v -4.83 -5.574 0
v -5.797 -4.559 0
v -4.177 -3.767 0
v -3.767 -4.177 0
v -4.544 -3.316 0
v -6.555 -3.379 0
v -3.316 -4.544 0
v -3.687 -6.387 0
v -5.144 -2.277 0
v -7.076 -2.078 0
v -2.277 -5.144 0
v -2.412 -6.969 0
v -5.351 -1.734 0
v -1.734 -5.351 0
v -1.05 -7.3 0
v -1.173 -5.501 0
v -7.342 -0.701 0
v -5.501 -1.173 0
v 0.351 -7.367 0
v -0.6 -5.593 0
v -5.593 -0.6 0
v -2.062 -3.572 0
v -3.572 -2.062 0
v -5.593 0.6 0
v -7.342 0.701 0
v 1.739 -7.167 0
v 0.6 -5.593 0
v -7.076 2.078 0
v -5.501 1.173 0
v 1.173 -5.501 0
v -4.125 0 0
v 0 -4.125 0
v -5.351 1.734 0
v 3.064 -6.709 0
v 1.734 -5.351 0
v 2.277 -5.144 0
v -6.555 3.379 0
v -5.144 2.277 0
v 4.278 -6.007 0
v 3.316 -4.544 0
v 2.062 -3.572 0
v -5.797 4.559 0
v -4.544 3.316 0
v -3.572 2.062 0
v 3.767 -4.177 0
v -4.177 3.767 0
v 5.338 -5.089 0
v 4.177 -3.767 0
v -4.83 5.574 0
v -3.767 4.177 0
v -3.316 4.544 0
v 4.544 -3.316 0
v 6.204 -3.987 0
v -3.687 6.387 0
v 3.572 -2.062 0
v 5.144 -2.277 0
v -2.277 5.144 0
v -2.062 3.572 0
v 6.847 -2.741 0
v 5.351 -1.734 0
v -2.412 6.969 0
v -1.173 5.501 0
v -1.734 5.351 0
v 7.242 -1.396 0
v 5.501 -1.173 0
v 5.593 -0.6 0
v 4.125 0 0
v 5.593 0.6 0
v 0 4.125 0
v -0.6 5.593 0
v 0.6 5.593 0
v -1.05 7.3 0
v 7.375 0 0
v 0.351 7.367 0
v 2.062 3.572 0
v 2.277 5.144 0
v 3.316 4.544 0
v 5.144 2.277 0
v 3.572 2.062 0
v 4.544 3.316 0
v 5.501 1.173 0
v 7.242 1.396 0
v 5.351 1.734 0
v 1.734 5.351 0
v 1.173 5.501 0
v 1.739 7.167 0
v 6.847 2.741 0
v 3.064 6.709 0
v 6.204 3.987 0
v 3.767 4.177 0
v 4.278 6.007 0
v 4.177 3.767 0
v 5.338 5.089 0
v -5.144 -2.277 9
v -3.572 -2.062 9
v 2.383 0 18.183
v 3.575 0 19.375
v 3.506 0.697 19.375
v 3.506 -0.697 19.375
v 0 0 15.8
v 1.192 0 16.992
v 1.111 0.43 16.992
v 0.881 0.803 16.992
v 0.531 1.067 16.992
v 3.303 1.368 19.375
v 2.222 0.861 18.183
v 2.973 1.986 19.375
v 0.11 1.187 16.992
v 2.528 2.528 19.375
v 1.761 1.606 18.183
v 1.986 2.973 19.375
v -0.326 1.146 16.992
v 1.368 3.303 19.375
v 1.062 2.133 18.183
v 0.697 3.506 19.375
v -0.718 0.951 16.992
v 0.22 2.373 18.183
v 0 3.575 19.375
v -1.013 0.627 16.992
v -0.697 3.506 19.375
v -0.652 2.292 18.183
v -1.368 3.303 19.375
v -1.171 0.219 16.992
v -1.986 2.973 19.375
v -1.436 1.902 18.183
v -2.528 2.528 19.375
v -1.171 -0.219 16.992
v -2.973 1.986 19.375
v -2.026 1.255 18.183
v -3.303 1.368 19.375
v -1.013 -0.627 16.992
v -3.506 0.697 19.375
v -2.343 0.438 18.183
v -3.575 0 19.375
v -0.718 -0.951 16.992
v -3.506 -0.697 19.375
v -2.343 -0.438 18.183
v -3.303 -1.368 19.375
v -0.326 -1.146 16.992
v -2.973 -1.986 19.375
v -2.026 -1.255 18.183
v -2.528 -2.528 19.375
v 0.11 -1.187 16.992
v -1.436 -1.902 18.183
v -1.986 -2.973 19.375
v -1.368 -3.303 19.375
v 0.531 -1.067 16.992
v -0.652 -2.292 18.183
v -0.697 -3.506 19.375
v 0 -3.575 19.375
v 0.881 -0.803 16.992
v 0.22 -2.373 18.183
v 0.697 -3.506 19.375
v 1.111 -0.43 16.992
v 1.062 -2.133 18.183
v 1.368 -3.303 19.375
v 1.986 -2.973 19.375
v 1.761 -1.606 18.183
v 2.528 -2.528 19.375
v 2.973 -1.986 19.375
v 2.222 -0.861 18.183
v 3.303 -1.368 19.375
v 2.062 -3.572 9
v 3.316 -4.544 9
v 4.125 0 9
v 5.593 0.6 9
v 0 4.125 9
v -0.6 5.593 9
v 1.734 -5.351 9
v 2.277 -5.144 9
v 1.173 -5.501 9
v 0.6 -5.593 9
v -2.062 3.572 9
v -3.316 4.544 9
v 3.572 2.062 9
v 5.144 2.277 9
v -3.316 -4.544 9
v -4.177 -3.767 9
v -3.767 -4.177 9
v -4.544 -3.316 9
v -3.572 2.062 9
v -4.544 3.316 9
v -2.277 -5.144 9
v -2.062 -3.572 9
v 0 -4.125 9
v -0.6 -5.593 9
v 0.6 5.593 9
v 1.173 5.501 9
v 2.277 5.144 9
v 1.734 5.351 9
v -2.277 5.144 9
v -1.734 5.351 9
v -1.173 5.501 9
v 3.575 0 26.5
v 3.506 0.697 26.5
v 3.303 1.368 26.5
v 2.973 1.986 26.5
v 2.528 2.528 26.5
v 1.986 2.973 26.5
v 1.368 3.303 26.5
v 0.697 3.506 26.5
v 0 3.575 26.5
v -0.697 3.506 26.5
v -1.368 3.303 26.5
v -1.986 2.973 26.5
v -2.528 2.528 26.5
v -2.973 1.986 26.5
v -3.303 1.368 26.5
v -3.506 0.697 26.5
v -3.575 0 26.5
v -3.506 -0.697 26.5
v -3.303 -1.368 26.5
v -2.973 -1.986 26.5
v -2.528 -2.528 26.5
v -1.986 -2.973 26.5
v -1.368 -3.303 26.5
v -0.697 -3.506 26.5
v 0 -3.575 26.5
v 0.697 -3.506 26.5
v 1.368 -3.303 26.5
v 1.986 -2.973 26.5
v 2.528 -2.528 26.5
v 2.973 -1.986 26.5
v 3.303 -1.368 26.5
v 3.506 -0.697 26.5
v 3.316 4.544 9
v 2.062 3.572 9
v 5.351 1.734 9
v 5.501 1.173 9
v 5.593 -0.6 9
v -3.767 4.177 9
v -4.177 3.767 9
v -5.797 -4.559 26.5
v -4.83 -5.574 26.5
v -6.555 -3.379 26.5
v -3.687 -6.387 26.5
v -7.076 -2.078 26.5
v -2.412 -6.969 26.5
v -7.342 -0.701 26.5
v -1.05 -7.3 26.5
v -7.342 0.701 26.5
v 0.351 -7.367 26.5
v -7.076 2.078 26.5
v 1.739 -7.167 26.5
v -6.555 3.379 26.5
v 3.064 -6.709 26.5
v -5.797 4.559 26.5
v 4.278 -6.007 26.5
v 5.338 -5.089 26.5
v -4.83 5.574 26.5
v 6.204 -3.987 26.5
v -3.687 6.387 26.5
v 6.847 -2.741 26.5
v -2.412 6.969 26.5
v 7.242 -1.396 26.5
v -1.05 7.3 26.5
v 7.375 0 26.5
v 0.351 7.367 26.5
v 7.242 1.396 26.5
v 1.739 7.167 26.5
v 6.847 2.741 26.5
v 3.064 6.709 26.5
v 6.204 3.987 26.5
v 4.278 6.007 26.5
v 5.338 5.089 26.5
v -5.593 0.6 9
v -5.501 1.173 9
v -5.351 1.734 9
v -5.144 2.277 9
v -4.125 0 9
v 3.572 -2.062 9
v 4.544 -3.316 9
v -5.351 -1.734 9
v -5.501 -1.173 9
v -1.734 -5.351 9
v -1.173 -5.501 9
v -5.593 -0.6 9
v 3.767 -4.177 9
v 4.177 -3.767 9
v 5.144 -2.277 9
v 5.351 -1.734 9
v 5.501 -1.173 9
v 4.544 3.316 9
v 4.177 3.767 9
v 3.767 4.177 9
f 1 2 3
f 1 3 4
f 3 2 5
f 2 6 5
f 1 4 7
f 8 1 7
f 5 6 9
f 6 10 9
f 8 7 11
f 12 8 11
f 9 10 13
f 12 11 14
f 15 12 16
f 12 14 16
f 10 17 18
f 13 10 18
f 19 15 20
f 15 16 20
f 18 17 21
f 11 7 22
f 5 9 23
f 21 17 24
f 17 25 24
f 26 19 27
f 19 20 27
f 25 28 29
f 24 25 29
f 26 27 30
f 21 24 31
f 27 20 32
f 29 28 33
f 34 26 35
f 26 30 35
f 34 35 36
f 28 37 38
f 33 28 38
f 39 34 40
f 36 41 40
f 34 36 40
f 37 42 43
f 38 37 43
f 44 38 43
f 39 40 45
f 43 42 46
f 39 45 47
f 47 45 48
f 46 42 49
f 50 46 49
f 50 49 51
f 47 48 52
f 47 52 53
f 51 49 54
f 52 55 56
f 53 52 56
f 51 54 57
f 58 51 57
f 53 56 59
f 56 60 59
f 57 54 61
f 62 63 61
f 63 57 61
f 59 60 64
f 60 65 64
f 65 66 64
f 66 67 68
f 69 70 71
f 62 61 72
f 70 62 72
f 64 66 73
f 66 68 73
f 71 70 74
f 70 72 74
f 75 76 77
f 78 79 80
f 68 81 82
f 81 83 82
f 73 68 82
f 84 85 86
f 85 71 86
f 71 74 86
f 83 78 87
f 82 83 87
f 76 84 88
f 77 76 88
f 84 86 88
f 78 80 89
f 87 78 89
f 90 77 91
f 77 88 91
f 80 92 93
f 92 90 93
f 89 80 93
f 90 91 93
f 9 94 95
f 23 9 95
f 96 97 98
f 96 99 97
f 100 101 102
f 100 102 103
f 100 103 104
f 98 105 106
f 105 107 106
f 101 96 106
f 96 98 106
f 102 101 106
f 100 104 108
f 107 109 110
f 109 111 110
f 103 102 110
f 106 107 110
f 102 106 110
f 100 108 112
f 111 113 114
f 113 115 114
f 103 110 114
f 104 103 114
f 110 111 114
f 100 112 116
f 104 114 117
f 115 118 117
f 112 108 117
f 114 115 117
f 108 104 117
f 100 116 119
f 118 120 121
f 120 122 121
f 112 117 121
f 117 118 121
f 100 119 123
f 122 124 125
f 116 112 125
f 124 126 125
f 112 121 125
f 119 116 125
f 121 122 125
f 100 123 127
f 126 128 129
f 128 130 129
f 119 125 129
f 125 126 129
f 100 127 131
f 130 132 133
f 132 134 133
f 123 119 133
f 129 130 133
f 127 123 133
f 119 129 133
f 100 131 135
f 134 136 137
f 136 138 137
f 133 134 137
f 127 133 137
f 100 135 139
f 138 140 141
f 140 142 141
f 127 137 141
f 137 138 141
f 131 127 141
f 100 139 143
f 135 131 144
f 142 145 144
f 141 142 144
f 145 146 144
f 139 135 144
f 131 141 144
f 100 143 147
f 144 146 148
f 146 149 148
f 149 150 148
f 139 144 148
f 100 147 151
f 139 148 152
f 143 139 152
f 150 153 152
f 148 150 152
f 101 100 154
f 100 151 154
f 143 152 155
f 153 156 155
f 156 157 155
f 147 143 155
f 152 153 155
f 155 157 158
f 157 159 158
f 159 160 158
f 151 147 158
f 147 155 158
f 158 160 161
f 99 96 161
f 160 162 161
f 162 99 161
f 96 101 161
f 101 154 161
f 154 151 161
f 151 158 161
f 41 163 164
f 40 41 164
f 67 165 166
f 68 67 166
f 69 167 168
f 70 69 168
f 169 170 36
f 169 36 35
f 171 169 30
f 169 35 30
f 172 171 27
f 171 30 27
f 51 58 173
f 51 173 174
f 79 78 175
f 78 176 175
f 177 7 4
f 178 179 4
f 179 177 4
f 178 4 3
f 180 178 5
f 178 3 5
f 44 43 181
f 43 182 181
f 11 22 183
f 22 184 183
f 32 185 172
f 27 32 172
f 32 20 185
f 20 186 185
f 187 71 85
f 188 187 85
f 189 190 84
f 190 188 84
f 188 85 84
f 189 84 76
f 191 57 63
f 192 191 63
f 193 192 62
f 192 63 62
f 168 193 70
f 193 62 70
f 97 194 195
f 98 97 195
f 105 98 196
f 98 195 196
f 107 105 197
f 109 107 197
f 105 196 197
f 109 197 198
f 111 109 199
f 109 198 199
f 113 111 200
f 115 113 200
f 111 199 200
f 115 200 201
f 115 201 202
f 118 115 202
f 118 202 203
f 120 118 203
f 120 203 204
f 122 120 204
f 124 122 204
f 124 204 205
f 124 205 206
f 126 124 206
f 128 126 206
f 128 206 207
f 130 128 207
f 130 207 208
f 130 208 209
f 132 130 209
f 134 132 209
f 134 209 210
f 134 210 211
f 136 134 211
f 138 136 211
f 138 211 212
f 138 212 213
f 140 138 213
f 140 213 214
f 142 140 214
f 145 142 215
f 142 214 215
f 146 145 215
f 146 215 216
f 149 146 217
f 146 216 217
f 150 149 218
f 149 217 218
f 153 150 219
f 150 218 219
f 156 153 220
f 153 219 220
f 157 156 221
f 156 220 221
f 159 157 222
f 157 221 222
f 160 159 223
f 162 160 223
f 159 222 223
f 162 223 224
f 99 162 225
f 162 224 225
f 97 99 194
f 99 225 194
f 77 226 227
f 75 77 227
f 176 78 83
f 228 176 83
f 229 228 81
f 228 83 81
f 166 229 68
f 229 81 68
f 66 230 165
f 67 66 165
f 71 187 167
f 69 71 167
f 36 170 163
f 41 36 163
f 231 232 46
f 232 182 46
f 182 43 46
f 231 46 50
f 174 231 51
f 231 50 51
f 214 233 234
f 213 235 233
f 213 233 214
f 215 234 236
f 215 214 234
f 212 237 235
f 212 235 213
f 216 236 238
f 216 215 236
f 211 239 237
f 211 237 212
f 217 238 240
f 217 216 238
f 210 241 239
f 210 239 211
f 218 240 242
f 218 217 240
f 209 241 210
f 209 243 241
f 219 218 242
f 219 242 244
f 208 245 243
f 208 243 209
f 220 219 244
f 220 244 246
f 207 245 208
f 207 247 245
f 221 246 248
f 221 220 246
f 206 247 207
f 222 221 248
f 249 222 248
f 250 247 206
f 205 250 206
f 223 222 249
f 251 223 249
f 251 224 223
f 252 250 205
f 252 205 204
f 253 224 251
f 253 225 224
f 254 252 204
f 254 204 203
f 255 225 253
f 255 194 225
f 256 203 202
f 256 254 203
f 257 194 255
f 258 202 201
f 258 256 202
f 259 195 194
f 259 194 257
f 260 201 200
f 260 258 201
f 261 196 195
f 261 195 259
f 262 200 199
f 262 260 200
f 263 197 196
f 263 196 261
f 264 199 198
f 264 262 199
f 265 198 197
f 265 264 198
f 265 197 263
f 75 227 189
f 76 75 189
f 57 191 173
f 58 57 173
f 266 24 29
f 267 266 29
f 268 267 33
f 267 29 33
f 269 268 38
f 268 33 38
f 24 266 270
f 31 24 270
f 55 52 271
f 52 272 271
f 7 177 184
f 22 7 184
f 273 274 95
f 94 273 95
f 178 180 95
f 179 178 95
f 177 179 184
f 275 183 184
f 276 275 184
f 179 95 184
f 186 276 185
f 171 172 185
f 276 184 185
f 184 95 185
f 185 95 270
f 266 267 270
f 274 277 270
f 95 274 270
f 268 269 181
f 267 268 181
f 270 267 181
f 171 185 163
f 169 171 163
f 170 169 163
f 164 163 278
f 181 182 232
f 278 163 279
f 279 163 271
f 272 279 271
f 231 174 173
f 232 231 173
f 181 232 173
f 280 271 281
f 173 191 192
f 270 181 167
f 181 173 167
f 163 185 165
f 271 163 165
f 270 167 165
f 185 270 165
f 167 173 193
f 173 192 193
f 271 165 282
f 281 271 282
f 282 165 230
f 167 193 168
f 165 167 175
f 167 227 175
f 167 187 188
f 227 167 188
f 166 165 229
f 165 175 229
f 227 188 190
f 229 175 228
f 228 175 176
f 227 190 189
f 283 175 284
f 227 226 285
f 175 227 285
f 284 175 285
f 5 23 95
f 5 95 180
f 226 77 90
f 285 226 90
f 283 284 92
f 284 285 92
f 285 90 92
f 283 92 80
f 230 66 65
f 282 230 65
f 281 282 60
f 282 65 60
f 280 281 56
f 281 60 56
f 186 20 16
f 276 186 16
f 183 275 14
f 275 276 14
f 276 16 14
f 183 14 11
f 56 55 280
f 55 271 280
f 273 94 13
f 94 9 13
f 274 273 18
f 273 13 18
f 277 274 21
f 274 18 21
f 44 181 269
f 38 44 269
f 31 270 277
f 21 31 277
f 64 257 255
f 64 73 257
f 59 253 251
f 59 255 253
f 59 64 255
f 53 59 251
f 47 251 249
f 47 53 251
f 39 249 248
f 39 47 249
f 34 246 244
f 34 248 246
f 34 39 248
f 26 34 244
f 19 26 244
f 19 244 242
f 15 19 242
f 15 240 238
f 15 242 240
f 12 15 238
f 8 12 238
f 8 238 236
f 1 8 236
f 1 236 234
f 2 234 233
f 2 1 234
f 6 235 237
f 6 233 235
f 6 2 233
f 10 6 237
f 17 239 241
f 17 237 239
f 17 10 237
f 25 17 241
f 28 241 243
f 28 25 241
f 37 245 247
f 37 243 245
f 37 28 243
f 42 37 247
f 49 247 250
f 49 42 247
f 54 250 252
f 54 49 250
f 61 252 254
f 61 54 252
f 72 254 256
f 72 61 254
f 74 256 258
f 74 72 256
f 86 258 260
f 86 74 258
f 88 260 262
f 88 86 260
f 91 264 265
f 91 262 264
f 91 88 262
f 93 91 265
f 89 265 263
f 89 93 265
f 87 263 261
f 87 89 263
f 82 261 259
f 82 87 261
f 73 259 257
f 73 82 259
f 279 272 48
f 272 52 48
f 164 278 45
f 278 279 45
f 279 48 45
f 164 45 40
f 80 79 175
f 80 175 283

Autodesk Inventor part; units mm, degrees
ref_plane "YZ Plane" through (0, 0, 0) normal (1, 0, 0) x (0, 1, 0)
ref_plane "XZ Plane" through (0, 0, 0) normal (0, 1, 0) x (-1, 0, 0)
ref_plane "XY Plane" through (0, 0, 0) normal (0, 0, 1) x (1, 0, 0)
sketch "Sketch1" plane through (0, 0, 0) normal (0, 0, 1) x (1, 0, 0)
  circle A0 centre (0, 0) radius 5.625
  circle A1 centre (0, 0) radius 7.375
  dimension "d0" = 11.25
  dimension "d1" = 14.75
extrude "Extrusion1" add sketch "Sketch1" along normal blind 9
sketch "Sketch2" plane through (0, 0, 9) normal (0, 0, 1) x (1, 0, 0)
  circle A0 centre (0, 0) radius 7.375 projected
  circle A1 centre (0, 0) radius 7.375
extrude "Extrusion2" add sketch "Sketch2" along normal blind 17.5
sketch "Sketch3" plane through (0, 0, 26.5) normal (0, 0, 1) x (1, 0, 0)
  circle A0 centre (0, 0) radius 7.375 projected
  circle A1 centre (0, 0) radius 3.575
  dimension "d6" = 7.15
extrude "Extrusion3" cut sketch "Sketch3" against normal blind 7.5 contours A1
sketch "Sketch4" plane through (0, 0, 19) normal (0, 0, 1) x (1, 0, 0)
  circle A0 centre (0, 0) radius 3.575 projected
  circle A1 centre (0, 0) radius 3.575
extrude "Extrusion4" cut sketch "Sketch4" against normal blind 3.2
chamfer "Chamfer1" distance 3.575 angle 45 1 edges at (-3.575, 0, 15.8)
sketch "Sketch5" plane through (0, 0, 9) normal (0, 0, -1) x (-1, 0, 0)
  circle A0 centre (0, 0) radius 5.625 projected
  line L0 (-0.6, 5.5929) -> (0, 4.125)
  line L1 (0, 4.125) -> (0.6, 5.5929)
  arc A1 (0.6, 5.5929) -> (-0.6, 5.5929) centre (0, 0) ccw
  line L2 (-3.3161, 4.5436) -> (-2.0625, 3.5724)
  line L3 (-2.0625, 3.5724) -> (-2.2768, 5.1436)
  arc A2 (-2.2768, 5.1436) -> (-3.3161, 4.5436) centre (0, 0) ccw
  line L4 (-5.1436, 2.2768) -> (-3.5724, 2.0625)
  line L5 (-3.5724, 2.0625) -> (-4.5436, 3.3161)
  arc A3 (-4.5436, 3.3161) -> (-5.1436, 2.2768) centre (0, 0) ccw
  line L6 (-5.5929, -0.6) -> (-4.125, 0)
  line L7 (-4.125, 0) -> (-5.5929, 0.6)
  arc A4 (-5.5929, 0.6) -> (-5.5929, -0.6) centre (0, 0) ccw
  line L8 (-4.5436, -3.3161) -> (-3.5724, -2.0625)
  line L9 (-3.5724, -2.0625) -> (-5.1436, -2.2768)
  arc A5 (-5.1436, -2.2768) -> (-4.5436, -3.3161) centre (0, 0) ccw
  line L10 (-2.2768, -5.1436) -> (-2.0625, -3.5724)
  line L11 (-2.0625, -3.5724) -> (-3.3161, -4.5436)
  arc A6 (-3.3161, -4.5436) -> (-2.2768, -5.1436) centre (0, 0) ccw
  line L12 (0.6, -5.5929) -> (0, -4.125)
  line L13 (0, -4.125) -> (-0.6, -5.5929)
  arc A7 (-0.6, -5.5929) -> (0.6, -5.5929) centre (0, 0) ccw
  line L14 (3.3161, -4.5436) -> (2.0625, -3.5724)
  line L15 (2.0625, -3.5724) -> (2.2768, -5.1436)
  arc A8 (2.2768, -5.1436) -> (3.3161, -4.5436) centre (0, 0) ccw
  line L16 (5.1436, -2.2768) -> (3.5724, -2.0625)
  line L17 (3.5724, -2.0625) -> (4.5436, -3.3161)
  arc A9 (4.5436, -3.3161) -> (5.1436, -2.2768) centre (0, 0) ccw
  line L18 (5.5929, 0.6) -> (4.125, 0)
  line L19 (4.125, 0) -> (5.5929, -0.6)
  arc A10 (5.5929, -0.6) -> (5.5929, 0.6) centre (0, 0) ccw
  line L20 (4.5436, 3.3161) -> (3.5724, 2.0625)
  line L21 (3.5724, 2.0625) -> (5.1436, 2.2768)
  arc A11 (5.1436, 2.2768) -> (4.5436, 3.3161) centre (0, 0) ccw
  line L22 (2.2768, 5.1436) -> (2.0625, 3.5724)
  line L23 (2.0625, 3.5724) -> (3.3161, 4.5436)
  arc A12 (3.3161, 4.5436) -> (2.2768, 5.1436) centre (0, 0) ccw
  point P0 (0, 5.625)
  point P1 (-2.8125, 4.8714)
  point P2 (-4.8714, 2.8125)
  point P3 (-5.625, 0)
  point P4 (-4.8714, -2.8125)
  point P5 (-2.8125, -4.8714)
  point P6 (0, -5.625)
  point P7 (2.8125, -4.8714)
  point P8 (4.8714, -2.8125)
  point P9 (5.625, 0)
  point P10 (4.8714, 2.8125)
  point P11 (2.8125, 4.8714)
  dimension "d16" = 1.5
  dimension "d17" = 0.6
  dimension "d18" = 0
  dimension "d19" = 0
  dimension "d20" = 0.6
  dimension "d23" = 360
extrude "Extrusion5" add sketch "Sketch5" along normal blind 9 contours A0 L19 L18 | L21 L20 A0 | A0 L17 L16 | L23 L22 A0 | A0 L15 L14 | L1 L0 A0 | A0 L13 L12 | L3 L2 A0 | A0 L11 L10 | L5 L4 A0 | A0 L9 L8 | L7 L6 A0
properties part number "shaft coupler"
